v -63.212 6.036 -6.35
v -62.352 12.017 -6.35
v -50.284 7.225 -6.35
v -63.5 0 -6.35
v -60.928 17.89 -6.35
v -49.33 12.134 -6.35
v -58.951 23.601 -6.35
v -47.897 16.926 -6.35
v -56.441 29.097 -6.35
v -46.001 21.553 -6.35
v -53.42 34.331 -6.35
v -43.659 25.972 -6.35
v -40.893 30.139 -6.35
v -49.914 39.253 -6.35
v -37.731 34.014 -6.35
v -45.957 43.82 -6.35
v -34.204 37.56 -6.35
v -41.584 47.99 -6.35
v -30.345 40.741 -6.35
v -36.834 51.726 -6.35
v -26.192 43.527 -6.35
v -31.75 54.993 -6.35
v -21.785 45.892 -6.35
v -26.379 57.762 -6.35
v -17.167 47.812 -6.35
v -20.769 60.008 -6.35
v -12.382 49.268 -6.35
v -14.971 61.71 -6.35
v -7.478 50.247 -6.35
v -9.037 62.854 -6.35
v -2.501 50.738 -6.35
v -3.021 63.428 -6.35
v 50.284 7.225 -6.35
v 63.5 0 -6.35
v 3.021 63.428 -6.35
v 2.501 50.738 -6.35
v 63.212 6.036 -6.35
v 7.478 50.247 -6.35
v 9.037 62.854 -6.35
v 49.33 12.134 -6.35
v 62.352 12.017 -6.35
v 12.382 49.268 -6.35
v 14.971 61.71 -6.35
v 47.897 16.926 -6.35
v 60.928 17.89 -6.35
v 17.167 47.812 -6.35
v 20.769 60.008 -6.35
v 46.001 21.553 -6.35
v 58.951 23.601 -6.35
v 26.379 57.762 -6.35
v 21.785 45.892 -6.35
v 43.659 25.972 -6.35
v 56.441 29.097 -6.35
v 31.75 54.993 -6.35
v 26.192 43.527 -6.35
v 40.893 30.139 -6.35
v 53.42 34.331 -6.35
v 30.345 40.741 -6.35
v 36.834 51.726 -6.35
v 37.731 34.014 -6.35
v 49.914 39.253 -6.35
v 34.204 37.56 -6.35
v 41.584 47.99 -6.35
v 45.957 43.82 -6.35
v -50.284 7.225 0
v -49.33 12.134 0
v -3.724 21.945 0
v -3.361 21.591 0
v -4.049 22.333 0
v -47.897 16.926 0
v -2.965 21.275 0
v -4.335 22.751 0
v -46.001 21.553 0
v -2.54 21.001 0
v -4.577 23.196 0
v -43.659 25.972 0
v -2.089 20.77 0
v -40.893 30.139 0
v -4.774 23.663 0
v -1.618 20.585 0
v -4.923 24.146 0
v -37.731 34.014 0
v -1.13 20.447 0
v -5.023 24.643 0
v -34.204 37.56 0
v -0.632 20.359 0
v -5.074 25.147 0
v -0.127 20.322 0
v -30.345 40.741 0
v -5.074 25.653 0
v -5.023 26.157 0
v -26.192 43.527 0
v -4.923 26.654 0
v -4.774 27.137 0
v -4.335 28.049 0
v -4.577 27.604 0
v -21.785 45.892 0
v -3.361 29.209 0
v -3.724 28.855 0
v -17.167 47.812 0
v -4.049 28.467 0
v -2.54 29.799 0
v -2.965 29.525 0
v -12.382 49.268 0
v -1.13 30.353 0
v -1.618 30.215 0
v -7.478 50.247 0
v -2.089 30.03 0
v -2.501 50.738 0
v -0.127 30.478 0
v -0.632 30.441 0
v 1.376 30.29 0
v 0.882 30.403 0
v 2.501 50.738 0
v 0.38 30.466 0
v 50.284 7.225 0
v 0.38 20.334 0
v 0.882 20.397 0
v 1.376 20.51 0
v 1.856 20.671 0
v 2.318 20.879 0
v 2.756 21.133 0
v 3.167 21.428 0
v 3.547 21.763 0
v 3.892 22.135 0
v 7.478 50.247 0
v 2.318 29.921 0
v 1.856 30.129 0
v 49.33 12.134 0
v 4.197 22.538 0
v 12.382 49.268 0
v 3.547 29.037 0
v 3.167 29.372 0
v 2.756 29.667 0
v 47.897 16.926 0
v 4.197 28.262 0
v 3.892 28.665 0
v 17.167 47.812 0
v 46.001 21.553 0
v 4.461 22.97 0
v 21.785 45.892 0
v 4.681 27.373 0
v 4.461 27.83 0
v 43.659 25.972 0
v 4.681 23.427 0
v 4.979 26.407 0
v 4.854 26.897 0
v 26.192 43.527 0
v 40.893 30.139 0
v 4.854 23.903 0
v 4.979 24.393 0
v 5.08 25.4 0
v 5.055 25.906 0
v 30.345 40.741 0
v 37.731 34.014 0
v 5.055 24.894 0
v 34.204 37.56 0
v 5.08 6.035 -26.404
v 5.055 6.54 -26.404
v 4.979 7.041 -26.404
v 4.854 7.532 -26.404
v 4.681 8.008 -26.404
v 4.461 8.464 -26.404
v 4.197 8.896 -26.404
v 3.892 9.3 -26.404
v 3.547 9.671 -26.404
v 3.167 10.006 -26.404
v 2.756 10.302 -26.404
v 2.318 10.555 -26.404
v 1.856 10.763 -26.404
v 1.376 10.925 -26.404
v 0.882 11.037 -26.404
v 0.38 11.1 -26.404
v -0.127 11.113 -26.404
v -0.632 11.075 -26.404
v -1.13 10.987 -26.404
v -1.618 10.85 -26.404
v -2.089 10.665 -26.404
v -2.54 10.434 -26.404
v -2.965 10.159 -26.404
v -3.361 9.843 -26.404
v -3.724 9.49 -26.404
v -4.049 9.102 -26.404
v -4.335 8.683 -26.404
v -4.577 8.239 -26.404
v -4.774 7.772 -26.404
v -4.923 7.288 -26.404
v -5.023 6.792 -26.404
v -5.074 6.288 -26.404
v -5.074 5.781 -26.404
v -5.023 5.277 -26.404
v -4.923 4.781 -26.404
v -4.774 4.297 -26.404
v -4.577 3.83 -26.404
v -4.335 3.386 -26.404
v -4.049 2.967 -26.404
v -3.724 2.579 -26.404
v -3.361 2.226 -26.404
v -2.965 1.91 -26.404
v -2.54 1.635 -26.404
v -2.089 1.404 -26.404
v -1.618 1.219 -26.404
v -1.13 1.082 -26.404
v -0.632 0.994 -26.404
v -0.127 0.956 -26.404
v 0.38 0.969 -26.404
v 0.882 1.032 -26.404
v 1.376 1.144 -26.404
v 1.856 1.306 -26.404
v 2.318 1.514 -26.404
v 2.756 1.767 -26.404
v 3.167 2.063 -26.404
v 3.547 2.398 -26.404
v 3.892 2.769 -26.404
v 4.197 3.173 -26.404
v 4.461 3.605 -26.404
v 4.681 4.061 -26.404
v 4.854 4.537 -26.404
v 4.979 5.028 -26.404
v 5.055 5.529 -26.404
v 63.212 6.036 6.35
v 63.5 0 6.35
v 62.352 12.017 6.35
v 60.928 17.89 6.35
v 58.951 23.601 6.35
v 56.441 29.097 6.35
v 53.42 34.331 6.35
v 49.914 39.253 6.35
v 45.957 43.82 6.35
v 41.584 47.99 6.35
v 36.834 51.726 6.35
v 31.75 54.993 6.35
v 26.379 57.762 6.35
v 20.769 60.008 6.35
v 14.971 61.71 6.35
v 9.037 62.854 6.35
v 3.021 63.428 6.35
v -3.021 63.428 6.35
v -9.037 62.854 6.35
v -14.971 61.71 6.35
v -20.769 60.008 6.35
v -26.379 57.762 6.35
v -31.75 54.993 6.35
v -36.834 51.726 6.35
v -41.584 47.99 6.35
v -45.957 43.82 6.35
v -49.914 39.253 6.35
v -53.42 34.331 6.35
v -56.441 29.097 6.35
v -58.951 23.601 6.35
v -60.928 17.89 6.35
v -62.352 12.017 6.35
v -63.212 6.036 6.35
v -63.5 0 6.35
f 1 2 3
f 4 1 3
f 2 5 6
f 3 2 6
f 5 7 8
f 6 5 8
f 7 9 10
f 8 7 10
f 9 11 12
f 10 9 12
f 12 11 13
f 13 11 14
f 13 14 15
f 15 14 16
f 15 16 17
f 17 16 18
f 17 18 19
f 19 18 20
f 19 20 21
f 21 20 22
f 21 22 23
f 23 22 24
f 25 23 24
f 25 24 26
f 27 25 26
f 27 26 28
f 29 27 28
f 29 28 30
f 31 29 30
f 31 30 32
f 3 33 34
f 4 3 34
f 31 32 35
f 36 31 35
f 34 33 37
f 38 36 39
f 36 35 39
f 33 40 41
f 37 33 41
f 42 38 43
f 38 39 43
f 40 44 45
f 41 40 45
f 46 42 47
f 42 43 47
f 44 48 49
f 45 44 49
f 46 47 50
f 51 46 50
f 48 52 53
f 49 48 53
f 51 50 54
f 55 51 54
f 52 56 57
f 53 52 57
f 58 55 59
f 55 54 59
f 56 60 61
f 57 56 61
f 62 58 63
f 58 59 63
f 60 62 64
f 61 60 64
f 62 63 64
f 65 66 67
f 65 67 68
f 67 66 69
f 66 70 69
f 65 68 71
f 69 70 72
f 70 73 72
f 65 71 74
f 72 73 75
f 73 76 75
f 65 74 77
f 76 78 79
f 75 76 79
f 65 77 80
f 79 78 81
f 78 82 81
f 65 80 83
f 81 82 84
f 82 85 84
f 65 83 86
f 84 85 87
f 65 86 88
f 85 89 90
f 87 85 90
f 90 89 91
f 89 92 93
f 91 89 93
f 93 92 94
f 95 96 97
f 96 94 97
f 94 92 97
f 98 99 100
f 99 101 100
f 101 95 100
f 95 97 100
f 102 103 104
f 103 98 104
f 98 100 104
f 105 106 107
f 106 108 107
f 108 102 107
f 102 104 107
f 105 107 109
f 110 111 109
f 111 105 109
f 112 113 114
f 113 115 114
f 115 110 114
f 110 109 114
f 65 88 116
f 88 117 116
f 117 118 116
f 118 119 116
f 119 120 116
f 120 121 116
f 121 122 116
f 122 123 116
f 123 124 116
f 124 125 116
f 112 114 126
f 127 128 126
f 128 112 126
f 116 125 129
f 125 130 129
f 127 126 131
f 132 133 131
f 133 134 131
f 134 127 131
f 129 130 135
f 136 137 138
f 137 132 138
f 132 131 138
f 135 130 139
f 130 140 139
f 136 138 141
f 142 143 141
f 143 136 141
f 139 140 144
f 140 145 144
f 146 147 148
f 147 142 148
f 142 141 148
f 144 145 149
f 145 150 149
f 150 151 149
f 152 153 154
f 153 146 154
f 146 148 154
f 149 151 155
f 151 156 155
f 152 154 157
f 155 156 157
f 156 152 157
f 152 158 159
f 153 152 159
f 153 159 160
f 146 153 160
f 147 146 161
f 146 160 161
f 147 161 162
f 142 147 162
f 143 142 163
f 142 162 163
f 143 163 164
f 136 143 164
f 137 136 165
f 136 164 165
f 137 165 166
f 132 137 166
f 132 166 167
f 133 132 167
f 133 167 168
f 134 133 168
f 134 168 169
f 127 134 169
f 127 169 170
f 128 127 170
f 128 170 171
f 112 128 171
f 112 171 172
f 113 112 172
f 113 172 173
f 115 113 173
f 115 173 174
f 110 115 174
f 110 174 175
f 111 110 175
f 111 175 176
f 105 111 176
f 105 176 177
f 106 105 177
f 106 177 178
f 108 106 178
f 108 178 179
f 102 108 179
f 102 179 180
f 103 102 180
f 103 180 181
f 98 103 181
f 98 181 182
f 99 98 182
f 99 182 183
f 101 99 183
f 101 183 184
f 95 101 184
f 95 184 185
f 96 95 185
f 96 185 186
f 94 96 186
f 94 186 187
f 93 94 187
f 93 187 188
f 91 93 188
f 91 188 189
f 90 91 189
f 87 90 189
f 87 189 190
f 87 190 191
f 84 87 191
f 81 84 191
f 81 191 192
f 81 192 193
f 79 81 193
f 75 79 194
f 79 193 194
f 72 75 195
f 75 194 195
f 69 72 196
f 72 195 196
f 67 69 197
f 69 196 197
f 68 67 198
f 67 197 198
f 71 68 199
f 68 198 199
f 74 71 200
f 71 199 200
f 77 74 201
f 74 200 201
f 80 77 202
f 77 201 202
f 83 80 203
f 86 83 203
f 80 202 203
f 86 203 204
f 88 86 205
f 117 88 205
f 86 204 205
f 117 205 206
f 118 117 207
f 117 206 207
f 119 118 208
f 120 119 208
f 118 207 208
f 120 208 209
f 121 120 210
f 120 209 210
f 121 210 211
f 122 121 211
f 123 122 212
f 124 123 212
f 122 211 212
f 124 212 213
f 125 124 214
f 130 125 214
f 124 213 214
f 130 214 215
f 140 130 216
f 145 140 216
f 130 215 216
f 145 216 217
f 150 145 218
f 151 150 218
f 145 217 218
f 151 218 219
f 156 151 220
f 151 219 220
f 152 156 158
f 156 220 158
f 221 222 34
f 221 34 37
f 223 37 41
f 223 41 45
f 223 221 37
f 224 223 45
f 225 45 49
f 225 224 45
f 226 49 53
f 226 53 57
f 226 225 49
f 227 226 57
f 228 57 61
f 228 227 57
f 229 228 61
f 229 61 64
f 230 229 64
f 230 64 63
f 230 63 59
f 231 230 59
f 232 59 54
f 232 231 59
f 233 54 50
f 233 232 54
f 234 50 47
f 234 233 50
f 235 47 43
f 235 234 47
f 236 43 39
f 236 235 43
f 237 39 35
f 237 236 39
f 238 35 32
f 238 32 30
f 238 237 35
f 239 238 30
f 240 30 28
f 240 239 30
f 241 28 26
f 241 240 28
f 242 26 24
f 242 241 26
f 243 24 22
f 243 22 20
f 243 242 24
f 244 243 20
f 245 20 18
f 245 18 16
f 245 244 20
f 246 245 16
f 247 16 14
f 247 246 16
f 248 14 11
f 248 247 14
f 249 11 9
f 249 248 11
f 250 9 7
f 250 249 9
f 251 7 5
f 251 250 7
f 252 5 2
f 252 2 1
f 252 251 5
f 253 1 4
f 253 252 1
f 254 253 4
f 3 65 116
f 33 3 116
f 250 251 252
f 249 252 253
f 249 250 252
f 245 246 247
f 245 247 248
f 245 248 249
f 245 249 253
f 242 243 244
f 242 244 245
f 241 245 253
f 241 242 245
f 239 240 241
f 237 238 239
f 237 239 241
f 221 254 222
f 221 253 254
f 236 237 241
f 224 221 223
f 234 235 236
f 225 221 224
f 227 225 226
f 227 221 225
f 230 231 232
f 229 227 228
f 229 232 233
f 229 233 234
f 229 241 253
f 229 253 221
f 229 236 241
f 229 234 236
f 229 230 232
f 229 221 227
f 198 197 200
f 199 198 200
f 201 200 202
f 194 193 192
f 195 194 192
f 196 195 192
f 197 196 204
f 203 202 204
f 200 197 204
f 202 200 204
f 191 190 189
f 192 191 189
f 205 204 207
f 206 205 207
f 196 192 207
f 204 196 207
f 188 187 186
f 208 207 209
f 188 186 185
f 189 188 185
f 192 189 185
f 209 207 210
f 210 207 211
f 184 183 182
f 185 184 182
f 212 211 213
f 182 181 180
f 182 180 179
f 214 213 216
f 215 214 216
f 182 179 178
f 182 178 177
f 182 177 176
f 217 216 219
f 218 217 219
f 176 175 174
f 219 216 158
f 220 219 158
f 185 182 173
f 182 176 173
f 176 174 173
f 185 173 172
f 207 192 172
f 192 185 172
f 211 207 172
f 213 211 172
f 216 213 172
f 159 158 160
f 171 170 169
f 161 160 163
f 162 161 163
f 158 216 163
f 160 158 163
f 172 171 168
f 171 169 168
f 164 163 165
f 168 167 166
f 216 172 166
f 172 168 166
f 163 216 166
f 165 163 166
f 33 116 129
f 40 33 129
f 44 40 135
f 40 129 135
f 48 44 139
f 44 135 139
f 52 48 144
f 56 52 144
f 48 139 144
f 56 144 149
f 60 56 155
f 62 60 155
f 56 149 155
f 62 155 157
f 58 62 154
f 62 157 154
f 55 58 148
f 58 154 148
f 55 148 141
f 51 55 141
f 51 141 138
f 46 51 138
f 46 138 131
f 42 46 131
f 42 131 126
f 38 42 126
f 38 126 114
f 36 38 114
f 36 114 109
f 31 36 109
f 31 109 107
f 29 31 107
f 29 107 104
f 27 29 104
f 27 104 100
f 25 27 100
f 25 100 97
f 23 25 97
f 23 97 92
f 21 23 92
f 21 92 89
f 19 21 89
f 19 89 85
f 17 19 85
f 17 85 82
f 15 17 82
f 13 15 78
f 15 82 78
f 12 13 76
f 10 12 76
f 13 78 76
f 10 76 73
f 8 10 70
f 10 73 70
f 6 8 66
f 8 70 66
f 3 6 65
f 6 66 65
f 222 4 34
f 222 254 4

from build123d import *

# Parameters (mm, degrees)
F1_DEPTH = 6.35
F3_DEPTH = 25.4
F4_R     = 3.81
F7_R     = 5.08


with BuildPart() as f1:
    # F0 (on Top) → F1 (new body, symmetric)
    with BuildSketch(Plane.XY):
        with BuildLine():
            Line((-63.5, 0), (63.5, 0))
            ThreePointArc((63.5, 0), (0, 63.5), (-63.5, 0))
        make_face()
    extrude(amount=F1_DEPTH, both=True)

    # F2 (on Top) → F3 (cut)
    with BuildSketch(Plane.XY):
        with BuildLine():
            Line((-50.2836502119, 7.2245775906), (50.2836502119, 7.2245775906))
            ThreePointArc((50.2836502119, 7.2245775906), (0, 50.8), (-50.2836502119, 7.2245775906))
        make_face()
    extrude(amount=-F3_DEPTH, mode=Mode.SUBTRACT)

    # F6: sweep along a path in F5
    with BuildLine(Plane.YZ) as f6_path:
        Line((25.5370624363, 0), (6.1716223136, -26.4036767185))
    # F4 (on Top) → F6 (sweep, cut)
    with BuildSketch(Plane.XY):
        with Locations((0, 25.4)):
            Circle(F4_R)
    sweep(path=f6_path.line, mode=Mode.SUBTRACT)

    # F8: sweep along a path in F5
    with BuildLine(Plane.YZ) as f8_path:
        Line((25.5370624363, 0), (6.1716223136, -26.4036767185))
    # F7 (on Top) → F8 (sweep)
    with BuildSketch(Plane.XY):
        with Locations((0, 25.4)):
            Circle(F7_R)
    sweep(path=f8_path.line)


solid = f1.part
